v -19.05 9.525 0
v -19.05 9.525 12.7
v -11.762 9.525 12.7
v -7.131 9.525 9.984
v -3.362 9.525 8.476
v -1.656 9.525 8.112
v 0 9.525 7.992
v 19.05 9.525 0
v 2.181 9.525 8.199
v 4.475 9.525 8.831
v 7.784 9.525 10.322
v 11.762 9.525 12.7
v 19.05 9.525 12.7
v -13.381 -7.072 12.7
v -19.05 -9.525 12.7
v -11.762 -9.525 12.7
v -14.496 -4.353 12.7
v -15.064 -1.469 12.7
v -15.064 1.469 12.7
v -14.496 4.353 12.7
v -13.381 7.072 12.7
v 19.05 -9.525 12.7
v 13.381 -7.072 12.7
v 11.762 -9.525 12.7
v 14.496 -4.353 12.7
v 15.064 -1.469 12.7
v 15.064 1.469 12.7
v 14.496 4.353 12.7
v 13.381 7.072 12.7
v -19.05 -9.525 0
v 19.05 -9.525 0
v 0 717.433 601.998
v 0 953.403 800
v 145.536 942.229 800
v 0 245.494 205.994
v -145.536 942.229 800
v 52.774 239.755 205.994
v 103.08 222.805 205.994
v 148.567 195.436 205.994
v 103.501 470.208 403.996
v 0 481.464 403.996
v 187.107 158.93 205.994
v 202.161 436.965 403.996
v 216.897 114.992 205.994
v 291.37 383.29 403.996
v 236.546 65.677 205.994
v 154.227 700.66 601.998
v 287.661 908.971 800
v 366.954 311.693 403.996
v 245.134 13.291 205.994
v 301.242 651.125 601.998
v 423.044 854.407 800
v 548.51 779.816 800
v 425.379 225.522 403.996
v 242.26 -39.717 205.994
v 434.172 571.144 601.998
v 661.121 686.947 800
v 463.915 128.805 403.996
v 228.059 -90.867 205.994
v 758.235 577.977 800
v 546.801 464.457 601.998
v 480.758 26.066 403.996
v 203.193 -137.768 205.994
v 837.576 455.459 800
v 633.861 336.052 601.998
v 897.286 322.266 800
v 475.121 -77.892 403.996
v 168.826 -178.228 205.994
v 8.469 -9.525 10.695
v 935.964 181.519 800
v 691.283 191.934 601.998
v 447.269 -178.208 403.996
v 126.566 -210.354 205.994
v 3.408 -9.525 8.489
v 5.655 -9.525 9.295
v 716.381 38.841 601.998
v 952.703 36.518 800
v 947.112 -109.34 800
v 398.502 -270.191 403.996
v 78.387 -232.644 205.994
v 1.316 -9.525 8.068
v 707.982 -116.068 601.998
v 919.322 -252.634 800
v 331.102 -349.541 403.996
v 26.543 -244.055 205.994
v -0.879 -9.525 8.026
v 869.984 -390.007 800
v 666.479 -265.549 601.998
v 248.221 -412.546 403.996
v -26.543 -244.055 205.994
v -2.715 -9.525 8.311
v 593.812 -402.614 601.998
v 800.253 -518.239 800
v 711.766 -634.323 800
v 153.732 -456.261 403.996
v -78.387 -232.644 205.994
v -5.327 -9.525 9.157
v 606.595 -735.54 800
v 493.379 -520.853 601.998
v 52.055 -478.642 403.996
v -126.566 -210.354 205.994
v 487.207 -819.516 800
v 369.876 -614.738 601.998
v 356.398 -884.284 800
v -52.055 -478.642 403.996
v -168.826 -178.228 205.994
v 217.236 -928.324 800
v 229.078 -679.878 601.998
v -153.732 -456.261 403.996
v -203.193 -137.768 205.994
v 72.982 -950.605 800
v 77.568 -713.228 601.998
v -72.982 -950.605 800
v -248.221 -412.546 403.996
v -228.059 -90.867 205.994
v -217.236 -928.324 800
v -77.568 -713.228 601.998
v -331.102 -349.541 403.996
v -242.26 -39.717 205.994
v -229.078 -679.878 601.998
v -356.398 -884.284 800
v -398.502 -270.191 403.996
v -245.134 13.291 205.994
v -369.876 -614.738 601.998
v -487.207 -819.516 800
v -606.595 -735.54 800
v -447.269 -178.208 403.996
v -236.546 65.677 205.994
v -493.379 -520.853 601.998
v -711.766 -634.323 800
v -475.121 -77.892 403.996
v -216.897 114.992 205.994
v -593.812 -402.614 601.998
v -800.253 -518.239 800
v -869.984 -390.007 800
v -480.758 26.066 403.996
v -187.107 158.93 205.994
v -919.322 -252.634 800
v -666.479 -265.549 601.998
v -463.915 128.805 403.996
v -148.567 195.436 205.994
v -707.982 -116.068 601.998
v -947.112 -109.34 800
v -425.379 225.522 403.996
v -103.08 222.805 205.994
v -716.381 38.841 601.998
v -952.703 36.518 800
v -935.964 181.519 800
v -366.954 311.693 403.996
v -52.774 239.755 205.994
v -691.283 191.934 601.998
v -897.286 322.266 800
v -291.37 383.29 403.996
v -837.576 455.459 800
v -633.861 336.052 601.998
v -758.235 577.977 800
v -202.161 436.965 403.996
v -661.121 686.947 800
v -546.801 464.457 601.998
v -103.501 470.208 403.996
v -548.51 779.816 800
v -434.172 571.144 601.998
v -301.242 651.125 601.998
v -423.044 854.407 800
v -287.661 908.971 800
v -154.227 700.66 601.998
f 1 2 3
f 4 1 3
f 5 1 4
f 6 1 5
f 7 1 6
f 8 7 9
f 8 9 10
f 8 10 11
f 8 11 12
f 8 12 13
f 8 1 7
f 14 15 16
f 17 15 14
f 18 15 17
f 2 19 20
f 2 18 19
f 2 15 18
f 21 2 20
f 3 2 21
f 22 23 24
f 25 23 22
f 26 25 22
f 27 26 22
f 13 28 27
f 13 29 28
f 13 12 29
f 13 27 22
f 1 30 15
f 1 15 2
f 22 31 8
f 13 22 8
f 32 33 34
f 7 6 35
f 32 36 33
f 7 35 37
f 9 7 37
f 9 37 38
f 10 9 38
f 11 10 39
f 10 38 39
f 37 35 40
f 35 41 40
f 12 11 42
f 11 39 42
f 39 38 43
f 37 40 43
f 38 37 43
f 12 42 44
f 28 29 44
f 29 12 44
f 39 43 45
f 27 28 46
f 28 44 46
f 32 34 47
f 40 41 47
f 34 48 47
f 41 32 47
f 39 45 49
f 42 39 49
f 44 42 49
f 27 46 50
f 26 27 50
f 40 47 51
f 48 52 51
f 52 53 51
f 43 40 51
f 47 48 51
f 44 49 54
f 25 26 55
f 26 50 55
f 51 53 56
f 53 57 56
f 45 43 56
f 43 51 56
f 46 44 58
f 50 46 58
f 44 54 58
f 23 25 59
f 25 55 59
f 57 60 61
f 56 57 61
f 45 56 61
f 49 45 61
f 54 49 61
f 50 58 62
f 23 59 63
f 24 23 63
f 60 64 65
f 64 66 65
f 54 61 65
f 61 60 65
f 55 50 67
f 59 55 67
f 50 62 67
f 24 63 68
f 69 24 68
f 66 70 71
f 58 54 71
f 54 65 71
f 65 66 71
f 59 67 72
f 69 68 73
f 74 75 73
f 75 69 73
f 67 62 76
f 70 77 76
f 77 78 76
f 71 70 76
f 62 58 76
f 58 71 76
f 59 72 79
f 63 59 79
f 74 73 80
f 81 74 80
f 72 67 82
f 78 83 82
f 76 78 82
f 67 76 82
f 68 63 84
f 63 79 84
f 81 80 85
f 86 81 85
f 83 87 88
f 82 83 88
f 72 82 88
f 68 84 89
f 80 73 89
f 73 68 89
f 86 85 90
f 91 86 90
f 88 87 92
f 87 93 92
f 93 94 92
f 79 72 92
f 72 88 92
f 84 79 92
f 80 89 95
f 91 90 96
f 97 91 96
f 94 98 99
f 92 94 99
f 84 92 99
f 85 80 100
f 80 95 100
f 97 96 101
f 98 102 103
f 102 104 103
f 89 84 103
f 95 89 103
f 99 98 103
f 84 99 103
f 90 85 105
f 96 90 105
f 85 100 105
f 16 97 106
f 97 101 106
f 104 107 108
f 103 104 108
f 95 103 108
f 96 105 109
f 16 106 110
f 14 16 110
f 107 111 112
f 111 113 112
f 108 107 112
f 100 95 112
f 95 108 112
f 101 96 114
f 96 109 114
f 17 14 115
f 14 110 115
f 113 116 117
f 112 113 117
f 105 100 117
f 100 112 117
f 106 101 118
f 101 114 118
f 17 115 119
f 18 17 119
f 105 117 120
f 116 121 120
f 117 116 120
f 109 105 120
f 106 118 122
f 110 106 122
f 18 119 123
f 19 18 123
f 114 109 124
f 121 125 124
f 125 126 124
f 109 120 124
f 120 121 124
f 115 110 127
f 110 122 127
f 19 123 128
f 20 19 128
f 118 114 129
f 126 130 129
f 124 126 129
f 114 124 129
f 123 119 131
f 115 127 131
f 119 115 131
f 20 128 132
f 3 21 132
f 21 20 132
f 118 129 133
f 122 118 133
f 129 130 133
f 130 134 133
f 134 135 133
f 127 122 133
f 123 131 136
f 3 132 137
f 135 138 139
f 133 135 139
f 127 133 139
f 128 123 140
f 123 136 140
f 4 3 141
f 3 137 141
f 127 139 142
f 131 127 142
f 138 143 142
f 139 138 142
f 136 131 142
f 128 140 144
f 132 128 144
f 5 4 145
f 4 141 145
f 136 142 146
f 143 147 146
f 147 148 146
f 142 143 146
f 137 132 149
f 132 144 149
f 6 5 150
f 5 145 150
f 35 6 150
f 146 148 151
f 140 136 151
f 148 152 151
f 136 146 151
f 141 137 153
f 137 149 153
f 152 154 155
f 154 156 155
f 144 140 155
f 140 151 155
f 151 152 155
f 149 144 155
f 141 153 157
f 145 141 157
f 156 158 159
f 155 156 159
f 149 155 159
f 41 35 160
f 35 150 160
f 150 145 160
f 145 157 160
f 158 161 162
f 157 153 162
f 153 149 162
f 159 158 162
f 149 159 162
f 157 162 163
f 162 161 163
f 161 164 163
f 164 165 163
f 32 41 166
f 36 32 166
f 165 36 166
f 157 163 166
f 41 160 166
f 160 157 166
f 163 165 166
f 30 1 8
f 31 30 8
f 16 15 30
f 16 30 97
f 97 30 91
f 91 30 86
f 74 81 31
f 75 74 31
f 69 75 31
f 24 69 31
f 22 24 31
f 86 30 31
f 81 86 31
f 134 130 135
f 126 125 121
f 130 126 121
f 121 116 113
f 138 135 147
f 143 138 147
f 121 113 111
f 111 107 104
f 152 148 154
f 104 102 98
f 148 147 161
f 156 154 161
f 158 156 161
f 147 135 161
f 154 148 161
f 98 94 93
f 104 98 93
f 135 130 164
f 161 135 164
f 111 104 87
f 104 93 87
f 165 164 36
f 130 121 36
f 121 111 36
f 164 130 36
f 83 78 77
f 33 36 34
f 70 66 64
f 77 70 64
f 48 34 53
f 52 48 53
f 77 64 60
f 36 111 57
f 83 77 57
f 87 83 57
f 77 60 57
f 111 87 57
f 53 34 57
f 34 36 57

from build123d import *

# Parameters (mm, degrees)
SKETCH1_W           = 38.1
SKETCH1_H           = 19.05
BOSS_EXTRUDE1_DEPTH = 12.7


with BuildPart() as part:
    # Sketch1 → Boss-Extrude1 (new body)
    with BuildSketch(Plane.XY):
        Rectangle(SKETCH1_W, SKETCH1_H)
    extrude(amount=BOSS_EXTRUDE1_DEPTH)

    # Sketch2 → Revolve1 (revolve)
    with BuildSketch(Plane(origin=(0, 0, 0), x_dir=(0, 0, -1), z_dir=(1, 0, 0))):
        Polygon((0, 0), (-800, 953.402874075), (-800, 0), align=None)
    revolve(axis=Axis((0, 0, 800), (0, 0, -1)))


solid = part.part
